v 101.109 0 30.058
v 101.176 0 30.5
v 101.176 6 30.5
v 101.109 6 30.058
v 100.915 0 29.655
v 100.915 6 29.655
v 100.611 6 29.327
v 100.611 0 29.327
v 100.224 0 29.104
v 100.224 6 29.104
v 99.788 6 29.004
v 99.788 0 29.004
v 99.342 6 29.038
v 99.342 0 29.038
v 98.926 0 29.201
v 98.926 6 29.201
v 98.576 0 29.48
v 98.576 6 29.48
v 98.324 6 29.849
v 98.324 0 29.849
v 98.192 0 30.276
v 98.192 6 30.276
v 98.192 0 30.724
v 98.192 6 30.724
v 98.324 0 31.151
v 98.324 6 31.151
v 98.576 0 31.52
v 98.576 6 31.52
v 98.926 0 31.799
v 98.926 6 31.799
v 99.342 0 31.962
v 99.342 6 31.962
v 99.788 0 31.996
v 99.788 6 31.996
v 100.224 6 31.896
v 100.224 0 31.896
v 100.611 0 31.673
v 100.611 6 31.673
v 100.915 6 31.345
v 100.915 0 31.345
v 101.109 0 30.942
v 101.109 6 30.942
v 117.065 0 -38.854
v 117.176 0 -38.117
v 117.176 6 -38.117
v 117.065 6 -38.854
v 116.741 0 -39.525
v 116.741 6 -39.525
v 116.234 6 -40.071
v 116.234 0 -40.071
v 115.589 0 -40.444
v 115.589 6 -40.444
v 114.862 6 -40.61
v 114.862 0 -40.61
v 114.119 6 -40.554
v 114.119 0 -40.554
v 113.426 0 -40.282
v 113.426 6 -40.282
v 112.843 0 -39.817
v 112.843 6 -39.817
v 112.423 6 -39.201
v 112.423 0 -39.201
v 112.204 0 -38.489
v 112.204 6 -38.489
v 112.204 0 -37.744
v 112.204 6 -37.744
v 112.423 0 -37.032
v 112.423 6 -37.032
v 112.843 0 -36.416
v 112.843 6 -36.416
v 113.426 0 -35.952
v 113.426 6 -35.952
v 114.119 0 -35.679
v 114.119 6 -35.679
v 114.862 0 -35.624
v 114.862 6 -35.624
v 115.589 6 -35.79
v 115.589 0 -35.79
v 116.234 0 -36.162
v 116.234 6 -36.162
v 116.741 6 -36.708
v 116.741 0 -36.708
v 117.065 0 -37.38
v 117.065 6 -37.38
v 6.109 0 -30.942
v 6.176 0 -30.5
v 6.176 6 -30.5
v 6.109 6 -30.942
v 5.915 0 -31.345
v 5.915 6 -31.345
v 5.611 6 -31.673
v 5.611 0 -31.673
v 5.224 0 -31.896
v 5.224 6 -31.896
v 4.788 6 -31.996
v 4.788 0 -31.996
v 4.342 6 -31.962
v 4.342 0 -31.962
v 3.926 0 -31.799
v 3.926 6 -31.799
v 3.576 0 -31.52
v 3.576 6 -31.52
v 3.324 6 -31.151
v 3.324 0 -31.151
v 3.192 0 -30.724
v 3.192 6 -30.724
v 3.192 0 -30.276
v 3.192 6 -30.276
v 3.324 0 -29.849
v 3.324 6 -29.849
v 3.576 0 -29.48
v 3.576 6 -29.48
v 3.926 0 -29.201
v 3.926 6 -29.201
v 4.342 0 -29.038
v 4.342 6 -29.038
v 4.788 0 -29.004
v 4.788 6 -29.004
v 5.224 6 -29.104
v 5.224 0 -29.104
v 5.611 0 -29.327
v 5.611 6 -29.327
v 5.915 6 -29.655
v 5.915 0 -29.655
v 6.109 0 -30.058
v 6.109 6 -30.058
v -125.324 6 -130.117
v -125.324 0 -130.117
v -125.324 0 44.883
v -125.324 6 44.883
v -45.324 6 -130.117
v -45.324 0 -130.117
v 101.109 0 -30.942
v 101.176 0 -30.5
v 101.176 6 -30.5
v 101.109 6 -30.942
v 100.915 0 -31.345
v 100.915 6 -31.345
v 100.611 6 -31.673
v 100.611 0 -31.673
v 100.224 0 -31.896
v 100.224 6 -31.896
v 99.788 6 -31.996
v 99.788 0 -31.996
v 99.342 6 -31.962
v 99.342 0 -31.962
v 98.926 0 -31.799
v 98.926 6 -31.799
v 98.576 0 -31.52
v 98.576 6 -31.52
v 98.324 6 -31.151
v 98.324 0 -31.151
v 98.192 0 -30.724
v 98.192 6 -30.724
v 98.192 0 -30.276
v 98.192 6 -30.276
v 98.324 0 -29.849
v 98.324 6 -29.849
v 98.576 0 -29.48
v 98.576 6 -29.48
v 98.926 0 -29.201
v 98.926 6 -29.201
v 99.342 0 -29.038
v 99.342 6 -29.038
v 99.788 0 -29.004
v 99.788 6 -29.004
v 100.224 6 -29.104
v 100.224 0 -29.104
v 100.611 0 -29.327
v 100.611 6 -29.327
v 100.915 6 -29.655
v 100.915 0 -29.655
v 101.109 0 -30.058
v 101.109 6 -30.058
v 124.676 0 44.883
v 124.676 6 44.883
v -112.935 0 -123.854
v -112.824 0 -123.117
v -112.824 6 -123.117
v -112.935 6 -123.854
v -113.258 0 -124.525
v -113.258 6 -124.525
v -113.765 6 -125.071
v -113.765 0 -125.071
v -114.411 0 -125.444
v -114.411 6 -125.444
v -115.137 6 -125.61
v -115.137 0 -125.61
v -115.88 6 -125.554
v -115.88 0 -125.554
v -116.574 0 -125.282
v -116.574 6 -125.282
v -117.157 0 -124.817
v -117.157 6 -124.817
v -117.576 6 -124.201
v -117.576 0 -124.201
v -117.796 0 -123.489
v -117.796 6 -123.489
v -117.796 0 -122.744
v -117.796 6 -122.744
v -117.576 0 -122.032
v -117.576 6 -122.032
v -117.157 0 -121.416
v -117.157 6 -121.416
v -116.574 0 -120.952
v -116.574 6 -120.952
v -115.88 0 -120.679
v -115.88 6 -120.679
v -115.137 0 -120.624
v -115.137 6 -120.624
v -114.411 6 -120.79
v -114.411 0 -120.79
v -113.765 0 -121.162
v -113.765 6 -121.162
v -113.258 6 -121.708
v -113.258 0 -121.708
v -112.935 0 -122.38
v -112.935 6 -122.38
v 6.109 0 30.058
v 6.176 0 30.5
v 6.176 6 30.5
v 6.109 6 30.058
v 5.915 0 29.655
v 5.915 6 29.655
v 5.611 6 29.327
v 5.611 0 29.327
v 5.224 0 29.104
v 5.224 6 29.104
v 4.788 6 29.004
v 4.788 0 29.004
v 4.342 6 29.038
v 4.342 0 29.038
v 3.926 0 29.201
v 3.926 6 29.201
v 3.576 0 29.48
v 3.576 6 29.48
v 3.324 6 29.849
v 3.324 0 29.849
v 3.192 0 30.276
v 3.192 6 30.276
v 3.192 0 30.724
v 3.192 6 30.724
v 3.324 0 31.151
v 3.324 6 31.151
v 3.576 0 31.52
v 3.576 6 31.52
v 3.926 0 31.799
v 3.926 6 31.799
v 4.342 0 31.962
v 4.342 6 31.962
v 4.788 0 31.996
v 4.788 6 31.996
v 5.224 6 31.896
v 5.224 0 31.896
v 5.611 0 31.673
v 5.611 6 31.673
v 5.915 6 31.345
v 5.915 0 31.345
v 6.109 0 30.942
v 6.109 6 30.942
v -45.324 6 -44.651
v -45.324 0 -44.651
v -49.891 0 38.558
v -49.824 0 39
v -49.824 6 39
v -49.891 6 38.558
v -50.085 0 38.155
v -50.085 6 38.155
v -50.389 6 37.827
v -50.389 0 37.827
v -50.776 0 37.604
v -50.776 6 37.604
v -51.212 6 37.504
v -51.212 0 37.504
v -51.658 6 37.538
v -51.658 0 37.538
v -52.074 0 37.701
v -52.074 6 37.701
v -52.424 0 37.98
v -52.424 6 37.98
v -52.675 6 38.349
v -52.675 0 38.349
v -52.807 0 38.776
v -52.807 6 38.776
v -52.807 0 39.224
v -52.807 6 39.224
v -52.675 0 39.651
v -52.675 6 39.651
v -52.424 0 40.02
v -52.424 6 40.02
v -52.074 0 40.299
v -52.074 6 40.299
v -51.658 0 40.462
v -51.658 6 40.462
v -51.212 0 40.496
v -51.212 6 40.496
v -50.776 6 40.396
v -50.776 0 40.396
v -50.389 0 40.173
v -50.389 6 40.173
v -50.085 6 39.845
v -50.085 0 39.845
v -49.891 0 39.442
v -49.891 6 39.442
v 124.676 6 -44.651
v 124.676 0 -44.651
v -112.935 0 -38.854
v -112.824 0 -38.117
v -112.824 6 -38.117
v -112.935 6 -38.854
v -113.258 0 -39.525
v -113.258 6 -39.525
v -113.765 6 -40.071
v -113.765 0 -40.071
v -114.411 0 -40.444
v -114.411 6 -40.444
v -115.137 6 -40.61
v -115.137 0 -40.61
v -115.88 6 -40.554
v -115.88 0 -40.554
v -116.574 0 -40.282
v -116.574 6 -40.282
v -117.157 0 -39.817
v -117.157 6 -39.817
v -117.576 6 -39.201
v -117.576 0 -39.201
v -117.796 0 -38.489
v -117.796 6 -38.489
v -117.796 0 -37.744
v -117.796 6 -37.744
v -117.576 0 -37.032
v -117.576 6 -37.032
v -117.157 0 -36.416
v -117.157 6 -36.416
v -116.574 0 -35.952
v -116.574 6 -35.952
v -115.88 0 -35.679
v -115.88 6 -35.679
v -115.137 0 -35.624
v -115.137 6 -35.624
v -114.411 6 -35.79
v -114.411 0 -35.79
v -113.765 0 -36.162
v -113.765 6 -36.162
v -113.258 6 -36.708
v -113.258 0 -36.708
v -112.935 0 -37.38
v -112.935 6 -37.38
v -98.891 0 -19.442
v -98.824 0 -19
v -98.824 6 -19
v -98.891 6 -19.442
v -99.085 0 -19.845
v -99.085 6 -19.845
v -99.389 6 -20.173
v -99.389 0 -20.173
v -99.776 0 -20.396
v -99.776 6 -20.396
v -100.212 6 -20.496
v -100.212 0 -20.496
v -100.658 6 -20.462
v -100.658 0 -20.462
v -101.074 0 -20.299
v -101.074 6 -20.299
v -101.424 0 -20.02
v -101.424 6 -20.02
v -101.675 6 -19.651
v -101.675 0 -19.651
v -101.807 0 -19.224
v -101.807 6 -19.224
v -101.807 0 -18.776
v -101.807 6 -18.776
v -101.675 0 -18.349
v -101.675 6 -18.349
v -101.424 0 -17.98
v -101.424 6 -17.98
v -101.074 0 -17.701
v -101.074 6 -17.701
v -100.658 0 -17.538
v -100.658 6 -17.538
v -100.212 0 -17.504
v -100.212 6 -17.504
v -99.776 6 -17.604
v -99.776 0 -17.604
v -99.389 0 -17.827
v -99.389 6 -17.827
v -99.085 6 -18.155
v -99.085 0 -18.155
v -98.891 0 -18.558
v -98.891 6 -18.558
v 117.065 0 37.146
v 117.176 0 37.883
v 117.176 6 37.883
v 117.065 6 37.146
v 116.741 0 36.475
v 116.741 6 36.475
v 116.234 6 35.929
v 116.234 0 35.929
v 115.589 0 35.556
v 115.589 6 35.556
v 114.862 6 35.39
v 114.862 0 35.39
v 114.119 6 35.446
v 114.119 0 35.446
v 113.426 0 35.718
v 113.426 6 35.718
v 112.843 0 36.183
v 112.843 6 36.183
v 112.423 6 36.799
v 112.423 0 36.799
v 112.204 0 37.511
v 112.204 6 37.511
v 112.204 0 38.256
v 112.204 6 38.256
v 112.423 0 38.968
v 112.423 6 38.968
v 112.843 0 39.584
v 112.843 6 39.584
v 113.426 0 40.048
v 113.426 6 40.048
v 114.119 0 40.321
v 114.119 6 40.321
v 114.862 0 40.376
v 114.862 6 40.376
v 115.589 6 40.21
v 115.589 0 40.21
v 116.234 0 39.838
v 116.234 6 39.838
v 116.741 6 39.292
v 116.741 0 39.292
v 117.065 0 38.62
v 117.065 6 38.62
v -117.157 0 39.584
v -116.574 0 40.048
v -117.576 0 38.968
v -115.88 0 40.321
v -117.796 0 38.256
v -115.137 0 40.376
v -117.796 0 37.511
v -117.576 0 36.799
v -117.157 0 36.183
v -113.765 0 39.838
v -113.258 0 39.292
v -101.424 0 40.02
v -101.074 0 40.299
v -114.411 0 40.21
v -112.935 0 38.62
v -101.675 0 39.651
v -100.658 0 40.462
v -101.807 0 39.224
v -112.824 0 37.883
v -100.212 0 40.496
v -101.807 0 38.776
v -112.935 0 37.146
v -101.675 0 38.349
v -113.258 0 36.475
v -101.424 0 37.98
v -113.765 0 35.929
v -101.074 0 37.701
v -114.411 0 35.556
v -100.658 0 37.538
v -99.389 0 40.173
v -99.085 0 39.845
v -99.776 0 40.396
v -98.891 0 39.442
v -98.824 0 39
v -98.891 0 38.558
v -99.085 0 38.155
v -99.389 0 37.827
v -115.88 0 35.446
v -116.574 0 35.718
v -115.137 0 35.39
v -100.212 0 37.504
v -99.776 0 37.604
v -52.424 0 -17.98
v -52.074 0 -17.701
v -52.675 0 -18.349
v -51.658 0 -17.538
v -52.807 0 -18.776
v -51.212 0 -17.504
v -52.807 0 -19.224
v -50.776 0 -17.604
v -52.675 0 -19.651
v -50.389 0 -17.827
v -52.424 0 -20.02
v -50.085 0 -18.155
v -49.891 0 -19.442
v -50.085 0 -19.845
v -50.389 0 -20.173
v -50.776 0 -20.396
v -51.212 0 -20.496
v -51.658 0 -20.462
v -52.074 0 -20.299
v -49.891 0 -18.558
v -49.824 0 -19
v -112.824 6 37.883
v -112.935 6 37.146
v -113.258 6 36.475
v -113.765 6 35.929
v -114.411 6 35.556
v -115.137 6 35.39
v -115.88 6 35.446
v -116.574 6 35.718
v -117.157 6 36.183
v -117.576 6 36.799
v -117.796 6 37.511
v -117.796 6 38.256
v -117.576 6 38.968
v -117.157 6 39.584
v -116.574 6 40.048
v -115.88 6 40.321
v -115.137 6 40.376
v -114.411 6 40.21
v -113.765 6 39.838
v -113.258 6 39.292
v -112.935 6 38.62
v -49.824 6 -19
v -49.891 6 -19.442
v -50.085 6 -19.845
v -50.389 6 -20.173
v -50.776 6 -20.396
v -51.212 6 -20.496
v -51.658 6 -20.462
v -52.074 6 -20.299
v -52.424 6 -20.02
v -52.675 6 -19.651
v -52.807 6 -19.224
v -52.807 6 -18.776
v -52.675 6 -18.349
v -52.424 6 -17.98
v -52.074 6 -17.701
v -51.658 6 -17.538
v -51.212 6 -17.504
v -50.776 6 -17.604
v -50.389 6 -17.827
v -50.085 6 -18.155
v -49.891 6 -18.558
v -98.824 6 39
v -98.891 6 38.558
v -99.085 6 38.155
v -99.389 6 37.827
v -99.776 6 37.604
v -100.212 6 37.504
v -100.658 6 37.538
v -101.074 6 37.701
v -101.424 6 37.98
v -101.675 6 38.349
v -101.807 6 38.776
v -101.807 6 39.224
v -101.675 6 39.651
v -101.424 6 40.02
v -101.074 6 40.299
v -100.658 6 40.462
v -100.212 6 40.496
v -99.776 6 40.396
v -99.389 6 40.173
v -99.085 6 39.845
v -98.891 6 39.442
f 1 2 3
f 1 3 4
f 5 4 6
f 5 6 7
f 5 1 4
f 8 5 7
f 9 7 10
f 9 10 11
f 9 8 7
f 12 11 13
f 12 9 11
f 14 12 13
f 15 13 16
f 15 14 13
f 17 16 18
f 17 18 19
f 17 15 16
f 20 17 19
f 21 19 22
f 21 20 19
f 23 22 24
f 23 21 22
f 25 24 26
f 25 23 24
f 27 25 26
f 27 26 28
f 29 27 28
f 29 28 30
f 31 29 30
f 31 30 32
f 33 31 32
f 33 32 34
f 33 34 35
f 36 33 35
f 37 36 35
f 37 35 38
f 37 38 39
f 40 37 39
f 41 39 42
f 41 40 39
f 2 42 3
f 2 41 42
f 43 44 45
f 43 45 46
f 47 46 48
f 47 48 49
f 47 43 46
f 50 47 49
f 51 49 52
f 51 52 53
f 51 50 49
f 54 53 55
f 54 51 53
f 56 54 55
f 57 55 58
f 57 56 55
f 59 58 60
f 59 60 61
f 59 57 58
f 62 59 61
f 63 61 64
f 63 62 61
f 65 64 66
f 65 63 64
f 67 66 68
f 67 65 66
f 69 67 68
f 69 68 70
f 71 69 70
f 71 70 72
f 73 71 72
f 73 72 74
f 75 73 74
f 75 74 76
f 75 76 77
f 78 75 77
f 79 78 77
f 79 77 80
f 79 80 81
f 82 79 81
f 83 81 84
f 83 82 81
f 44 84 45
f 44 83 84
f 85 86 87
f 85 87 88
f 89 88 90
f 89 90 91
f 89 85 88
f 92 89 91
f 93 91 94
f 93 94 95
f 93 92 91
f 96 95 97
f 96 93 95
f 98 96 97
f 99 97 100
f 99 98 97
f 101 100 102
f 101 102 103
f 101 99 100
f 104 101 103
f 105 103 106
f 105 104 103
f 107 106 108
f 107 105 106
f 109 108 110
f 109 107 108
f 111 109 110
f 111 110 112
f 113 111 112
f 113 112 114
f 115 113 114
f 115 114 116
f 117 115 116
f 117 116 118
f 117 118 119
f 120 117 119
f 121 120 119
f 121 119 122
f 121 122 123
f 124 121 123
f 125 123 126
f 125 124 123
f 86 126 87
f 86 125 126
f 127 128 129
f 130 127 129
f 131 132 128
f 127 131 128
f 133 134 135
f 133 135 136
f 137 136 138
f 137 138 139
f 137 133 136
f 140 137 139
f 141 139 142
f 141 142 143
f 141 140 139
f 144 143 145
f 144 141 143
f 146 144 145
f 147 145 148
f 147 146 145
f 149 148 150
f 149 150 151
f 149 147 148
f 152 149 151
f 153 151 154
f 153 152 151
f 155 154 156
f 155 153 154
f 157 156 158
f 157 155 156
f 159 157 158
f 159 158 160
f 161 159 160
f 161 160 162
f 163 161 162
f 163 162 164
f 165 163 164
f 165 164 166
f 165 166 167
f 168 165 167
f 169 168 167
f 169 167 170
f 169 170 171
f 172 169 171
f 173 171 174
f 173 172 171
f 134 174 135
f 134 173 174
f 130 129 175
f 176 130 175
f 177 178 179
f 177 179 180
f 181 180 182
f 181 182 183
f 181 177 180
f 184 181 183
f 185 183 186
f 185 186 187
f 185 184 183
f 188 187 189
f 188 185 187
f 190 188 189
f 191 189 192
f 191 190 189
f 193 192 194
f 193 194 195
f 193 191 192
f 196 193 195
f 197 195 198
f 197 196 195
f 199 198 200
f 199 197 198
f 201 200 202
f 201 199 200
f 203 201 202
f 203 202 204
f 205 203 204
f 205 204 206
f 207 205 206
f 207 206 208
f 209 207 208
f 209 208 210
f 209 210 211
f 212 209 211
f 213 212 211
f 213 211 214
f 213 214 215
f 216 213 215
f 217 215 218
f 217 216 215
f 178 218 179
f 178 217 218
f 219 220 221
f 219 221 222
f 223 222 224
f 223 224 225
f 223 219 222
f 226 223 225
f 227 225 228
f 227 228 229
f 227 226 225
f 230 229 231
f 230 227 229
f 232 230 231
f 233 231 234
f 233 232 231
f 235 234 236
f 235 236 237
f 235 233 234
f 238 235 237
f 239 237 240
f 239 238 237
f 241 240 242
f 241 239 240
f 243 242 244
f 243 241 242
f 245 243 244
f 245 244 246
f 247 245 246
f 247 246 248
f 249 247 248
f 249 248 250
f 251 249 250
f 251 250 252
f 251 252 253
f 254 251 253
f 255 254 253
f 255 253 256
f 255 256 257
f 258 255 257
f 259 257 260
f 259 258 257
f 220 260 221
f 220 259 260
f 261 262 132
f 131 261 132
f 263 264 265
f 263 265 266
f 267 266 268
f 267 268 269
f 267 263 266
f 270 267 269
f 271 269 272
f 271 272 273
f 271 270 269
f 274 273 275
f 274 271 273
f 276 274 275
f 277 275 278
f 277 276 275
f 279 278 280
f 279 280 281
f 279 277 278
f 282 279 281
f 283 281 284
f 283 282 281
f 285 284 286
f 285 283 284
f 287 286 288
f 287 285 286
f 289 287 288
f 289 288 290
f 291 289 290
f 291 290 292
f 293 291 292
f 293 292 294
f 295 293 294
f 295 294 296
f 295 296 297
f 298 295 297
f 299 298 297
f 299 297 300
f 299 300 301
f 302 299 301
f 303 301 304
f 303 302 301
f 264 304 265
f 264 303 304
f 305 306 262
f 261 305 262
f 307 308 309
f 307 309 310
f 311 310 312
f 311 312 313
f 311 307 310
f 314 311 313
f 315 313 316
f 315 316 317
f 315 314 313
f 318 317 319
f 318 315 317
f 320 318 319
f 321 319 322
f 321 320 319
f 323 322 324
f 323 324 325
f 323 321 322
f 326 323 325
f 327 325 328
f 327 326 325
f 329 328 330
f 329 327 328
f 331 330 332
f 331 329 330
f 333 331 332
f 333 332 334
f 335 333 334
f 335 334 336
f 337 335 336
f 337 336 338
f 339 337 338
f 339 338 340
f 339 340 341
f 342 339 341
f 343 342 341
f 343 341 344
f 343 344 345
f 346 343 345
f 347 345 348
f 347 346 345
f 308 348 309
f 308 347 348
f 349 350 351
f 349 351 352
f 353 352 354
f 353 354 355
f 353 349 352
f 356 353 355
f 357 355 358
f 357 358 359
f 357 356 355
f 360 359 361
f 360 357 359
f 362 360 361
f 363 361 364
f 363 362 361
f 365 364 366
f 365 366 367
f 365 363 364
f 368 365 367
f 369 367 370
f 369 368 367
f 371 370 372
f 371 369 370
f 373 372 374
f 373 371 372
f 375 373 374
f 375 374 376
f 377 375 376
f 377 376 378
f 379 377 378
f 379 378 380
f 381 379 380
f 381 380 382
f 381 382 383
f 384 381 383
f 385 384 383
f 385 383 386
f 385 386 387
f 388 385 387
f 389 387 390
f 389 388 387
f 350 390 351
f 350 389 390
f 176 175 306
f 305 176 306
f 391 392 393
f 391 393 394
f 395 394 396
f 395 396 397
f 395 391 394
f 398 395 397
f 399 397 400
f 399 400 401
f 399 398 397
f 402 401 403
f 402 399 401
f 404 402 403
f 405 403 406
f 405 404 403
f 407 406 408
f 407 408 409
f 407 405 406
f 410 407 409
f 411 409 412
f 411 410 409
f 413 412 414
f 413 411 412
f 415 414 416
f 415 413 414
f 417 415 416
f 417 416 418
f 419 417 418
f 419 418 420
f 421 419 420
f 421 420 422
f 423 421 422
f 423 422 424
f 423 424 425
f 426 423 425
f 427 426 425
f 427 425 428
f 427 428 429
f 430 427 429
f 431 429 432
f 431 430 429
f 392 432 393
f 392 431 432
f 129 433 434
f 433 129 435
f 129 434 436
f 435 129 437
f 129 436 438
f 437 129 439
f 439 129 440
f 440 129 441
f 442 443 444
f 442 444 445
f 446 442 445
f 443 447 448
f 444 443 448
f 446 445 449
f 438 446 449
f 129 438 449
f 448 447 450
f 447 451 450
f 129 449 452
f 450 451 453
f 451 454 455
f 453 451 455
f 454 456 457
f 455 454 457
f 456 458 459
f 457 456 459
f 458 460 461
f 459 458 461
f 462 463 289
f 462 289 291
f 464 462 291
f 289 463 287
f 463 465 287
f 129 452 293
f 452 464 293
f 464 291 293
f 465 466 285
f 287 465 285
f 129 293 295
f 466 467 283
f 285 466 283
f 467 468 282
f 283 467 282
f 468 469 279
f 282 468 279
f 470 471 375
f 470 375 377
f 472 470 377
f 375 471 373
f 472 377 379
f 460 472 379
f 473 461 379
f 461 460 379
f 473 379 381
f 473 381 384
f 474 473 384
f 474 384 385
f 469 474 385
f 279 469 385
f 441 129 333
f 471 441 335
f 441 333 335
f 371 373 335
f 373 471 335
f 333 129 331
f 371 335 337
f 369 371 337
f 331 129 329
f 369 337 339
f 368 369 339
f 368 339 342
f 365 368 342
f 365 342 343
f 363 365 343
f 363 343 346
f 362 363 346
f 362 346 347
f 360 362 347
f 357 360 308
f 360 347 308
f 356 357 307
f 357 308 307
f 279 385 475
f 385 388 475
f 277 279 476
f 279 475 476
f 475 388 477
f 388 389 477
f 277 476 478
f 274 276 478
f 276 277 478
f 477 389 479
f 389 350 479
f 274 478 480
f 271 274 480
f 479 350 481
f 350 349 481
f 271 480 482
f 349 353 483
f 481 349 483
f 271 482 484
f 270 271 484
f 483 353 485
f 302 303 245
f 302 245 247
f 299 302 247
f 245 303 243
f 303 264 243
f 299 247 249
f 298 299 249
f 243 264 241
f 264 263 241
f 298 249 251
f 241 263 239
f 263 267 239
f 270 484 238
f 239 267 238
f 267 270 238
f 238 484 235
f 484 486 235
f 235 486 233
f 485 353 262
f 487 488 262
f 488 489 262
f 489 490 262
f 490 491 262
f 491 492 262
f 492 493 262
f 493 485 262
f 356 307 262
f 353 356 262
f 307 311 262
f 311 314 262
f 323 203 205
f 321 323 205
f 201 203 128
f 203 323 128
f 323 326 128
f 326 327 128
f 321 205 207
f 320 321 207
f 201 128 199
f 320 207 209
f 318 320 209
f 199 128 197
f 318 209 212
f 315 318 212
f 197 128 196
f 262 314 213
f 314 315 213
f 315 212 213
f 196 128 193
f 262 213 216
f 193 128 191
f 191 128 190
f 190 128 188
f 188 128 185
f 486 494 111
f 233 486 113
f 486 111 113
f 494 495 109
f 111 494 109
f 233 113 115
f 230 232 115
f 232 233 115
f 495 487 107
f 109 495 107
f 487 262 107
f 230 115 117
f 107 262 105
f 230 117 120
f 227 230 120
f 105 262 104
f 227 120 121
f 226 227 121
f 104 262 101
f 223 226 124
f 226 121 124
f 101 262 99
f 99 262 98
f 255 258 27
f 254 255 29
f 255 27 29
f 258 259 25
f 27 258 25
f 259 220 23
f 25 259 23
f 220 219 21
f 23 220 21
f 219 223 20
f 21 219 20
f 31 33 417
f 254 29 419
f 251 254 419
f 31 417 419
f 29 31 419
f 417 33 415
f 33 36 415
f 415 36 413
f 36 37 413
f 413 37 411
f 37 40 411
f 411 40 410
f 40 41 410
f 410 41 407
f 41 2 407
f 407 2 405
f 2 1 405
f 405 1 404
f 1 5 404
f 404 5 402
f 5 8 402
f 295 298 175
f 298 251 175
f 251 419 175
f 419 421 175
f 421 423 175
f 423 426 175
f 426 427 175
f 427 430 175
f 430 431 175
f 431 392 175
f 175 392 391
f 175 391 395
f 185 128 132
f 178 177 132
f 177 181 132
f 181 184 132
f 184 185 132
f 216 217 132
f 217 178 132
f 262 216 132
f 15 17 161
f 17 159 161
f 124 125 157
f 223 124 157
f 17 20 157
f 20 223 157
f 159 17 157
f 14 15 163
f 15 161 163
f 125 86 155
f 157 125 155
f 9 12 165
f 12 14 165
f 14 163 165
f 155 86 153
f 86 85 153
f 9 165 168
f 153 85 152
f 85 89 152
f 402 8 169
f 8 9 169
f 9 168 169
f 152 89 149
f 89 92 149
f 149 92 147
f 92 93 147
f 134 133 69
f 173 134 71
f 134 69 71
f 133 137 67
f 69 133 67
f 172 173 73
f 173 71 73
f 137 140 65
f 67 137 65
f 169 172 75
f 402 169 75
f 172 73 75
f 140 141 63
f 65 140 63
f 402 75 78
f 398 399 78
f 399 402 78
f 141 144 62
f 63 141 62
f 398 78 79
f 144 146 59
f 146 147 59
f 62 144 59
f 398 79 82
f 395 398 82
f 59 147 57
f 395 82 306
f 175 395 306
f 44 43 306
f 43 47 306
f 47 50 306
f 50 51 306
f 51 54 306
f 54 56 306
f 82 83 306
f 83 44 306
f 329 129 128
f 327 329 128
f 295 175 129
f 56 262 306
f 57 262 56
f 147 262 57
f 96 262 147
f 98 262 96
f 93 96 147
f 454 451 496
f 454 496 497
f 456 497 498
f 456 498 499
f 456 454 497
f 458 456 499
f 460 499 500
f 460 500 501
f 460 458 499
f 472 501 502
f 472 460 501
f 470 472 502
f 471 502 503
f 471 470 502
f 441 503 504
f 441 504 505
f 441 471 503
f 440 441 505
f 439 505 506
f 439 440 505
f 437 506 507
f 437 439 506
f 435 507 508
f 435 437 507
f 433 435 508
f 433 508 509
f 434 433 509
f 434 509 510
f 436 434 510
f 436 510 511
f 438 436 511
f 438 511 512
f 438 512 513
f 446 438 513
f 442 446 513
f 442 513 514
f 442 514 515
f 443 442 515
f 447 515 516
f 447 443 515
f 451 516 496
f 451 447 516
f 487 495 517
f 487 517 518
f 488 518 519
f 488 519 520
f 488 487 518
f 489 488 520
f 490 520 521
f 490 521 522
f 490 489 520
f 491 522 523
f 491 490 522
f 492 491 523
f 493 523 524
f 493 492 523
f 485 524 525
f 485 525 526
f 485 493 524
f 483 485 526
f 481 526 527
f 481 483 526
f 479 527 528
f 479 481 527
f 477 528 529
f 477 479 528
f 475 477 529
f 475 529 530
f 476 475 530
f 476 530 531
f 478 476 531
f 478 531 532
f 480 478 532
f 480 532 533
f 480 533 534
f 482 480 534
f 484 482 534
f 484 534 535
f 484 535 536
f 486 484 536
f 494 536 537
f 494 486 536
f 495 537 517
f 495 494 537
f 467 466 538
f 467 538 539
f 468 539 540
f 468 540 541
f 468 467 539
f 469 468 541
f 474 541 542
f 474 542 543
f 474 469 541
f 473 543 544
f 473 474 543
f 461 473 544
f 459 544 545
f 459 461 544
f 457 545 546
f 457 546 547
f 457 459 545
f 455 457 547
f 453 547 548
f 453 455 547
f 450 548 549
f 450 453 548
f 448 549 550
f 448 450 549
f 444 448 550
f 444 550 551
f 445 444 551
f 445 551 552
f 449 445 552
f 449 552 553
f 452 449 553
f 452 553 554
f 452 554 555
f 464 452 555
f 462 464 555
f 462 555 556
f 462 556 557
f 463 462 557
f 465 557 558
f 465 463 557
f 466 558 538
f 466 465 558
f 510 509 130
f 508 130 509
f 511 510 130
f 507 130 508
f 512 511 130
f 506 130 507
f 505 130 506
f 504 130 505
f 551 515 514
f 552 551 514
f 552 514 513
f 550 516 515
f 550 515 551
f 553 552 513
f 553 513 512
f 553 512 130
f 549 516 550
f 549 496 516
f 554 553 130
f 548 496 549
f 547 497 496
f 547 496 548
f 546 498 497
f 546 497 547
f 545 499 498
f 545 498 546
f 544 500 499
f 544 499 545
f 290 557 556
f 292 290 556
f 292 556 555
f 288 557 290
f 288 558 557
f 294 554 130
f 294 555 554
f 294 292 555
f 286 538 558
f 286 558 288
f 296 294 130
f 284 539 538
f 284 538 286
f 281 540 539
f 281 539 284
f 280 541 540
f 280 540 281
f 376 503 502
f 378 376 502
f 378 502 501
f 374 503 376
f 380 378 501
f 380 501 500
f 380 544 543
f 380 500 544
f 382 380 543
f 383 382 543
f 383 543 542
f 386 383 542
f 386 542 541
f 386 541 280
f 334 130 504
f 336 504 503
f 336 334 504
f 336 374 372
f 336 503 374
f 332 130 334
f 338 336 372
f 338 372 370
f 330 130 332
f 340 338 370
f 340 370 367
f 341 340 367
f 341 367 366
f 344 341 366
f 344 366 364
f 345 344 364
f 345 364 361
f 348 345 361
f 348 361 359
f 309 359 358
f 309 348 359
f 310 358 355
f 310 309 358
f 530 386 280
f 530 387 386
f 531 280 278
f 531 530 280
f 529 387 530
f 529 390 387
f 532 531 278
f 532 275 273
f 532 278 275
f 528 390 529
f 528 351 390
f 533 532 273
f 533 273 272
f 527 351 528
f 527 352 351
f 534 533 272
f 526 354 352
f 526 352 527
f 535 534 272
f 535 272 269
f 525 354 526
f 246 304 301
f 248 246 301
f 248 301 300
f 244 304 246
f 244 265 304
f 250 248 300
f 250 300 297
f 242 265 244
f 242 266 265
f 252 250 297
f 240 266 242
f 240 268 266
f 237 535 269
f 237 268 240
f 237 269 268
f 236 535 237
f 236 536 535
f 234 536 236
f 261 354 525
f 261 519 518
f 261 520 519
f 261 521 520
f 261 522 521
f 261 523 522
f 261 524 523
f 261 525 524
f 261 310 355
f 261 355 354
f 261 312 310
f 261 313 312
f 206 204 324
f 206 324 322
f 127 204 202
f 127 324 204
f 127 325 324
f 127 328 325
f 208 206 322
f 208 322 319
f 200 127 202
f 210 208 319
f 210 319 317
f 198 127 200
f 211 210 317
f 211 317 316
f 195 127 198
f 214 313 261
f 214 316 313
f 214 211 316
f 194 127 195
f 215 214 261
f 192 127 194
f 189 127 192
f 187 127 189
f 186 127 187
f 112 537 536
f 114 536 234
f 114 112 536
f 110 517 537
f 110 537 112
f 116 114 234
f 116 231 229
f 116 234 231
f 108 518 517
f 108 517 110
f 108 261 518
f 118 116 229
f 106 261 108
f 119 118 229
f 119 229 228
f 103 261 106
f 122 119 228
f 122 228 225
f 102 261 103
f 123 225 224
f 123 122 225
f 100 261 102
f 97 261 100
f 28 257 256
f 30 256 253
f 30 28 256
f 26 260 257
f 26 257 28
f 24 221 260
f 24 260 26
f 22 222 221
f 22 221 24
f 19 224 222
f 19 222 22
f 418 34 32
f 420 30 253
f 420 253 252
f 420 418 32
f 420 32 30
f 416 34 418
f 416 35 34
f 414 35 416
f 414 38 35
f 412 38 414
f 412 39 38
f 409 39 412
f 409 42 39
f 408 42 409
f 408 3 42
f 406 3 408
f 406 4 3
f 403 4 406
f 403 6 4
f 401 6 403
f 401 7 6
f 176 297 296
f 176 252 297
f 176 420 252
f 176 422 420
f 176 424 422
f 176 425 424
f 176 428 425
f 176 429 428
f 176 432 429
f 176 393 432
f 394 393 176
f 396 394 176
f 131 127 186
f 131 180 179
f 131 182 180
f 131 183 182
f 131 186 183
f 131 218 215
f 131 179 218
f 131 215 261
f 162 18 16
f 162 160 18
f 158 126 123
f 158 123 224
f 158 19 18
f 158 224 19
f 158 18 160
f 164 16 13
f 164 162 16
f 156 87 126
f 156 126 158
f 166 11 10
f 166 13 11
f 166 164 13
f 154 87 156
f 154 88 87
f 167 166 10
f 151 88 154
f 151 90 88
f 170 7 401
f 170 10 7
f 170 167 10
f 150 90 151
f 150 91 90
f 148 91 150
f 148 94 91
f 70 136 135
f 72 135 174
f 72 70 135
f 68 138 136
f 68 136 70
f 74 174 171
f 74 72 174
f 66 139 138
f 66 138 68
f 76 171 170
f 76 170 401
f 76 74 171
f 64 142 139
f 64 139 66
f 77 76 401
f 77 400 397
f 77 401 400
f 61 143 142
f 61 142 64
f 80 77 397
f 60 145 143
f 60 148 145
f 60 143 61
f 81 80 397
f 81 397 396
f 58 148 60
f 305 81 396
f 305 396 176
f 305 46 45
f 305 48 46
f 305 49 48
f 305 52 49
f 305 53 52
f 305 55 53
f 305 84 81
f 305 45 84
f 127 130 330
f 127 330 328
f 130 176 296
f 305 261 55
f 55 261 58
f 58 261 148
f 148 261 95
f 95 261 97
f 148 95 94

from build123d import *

# Parameters (mm, degrees)
BOSS_EXTRUDE1_DEPTH = 6
SKETCH1_3_R         = 1.5
SKETCH1_3_R_2       = 2.5
CUT_EXTRUDE1_DEPTH  = 6
SKETCH1_4_R         = 1.5
SKETCH1_4_R_2       = 2.5
CUT_EXTRUDE3_DEPTH  = 6


with BuildPart() as part:
    # Sketch1 → Boss-Extrude1 (new body)
    with BuildSketch(Plane(origin=(0, 0, 0), x_dir=(1, 0, 0), z_dir=(0, 1, 0))):
        Polygon((-125.323936458, 45.11669536), (-125.323936458, 130.11669536), (-45.323936458, 130.11669536), (-45.323936458, 44.651121259), (124.675630024, 44.651121259), (124.675630024, -44.88330464), (-125.323936458, -44.88330464), align=None)
    extrude(amount=BOSS_EXTRUDE1_DEPTH)

    # Sketch1<3> → Cut-Extrude1 (cut)
    with BuildSketch(Plane(origin=(0, 0, 0), x_dir=(1, 0, 0), z_dir=(0, 1, 0))):
        with Locations((-100.323936458, 19)):
            Circle(SKETCH1_3_R)
        with Locations((-51.323936458, 19)):
            Circle(SKETCH1_3_R)
        with Locations((-51.323936458, -39)):
            Circle(SKETCH1_3_R)
        with Locations((-100.323936458, -39)):
            Circle(SKETCH1_3_R)
        with Locations((-115.323936458, 123.11669536)):
            Circle(SKETCH1_3_R_2)
    extrude(amount=CUT_EXTRUDE1_DEPTH, mode=Mode.SUBTRACT)

    # Sketch1<4> → Cut-Extrude3 (cut)
    with BuildSketch(Plane(origin=(0, 0, 0), x_dir=(1, 0, 0), z_dir=(0, 1, 0))):
        with Locations((4.675630024, 30.5)):
            Circle(SKETCH1_4_R)
        with Locations((99.675630024, 30.5)):
            Circle(SKETCH1_4_R)
        with Locations((99.675630024, -30.5)):
            Circle(SKETCH1_4_R)
        with Locations((4.675630024, -30.5)):
            Circle(SKETCH1_4_R)
        with Locations((-115.323936458, 38.11669536)):
            Circle(SKETCH1_4_R_2)
        with Locations((-115.323936458, -37.88330464)):
            Circle(SKETCH1_4_R_2)
        with Locations((114.675630024, -37.88330464)):
            Circle(SKETCH1_4_R_2)
        with Locations((114.675630024, 38.11669536)):
            Circle(SKETCH1_4_R_2)
    extrude(amount=CUT_EXTRUDE3_DEPTH, mode=Mode.SUBTRACT)


solid = part.part
